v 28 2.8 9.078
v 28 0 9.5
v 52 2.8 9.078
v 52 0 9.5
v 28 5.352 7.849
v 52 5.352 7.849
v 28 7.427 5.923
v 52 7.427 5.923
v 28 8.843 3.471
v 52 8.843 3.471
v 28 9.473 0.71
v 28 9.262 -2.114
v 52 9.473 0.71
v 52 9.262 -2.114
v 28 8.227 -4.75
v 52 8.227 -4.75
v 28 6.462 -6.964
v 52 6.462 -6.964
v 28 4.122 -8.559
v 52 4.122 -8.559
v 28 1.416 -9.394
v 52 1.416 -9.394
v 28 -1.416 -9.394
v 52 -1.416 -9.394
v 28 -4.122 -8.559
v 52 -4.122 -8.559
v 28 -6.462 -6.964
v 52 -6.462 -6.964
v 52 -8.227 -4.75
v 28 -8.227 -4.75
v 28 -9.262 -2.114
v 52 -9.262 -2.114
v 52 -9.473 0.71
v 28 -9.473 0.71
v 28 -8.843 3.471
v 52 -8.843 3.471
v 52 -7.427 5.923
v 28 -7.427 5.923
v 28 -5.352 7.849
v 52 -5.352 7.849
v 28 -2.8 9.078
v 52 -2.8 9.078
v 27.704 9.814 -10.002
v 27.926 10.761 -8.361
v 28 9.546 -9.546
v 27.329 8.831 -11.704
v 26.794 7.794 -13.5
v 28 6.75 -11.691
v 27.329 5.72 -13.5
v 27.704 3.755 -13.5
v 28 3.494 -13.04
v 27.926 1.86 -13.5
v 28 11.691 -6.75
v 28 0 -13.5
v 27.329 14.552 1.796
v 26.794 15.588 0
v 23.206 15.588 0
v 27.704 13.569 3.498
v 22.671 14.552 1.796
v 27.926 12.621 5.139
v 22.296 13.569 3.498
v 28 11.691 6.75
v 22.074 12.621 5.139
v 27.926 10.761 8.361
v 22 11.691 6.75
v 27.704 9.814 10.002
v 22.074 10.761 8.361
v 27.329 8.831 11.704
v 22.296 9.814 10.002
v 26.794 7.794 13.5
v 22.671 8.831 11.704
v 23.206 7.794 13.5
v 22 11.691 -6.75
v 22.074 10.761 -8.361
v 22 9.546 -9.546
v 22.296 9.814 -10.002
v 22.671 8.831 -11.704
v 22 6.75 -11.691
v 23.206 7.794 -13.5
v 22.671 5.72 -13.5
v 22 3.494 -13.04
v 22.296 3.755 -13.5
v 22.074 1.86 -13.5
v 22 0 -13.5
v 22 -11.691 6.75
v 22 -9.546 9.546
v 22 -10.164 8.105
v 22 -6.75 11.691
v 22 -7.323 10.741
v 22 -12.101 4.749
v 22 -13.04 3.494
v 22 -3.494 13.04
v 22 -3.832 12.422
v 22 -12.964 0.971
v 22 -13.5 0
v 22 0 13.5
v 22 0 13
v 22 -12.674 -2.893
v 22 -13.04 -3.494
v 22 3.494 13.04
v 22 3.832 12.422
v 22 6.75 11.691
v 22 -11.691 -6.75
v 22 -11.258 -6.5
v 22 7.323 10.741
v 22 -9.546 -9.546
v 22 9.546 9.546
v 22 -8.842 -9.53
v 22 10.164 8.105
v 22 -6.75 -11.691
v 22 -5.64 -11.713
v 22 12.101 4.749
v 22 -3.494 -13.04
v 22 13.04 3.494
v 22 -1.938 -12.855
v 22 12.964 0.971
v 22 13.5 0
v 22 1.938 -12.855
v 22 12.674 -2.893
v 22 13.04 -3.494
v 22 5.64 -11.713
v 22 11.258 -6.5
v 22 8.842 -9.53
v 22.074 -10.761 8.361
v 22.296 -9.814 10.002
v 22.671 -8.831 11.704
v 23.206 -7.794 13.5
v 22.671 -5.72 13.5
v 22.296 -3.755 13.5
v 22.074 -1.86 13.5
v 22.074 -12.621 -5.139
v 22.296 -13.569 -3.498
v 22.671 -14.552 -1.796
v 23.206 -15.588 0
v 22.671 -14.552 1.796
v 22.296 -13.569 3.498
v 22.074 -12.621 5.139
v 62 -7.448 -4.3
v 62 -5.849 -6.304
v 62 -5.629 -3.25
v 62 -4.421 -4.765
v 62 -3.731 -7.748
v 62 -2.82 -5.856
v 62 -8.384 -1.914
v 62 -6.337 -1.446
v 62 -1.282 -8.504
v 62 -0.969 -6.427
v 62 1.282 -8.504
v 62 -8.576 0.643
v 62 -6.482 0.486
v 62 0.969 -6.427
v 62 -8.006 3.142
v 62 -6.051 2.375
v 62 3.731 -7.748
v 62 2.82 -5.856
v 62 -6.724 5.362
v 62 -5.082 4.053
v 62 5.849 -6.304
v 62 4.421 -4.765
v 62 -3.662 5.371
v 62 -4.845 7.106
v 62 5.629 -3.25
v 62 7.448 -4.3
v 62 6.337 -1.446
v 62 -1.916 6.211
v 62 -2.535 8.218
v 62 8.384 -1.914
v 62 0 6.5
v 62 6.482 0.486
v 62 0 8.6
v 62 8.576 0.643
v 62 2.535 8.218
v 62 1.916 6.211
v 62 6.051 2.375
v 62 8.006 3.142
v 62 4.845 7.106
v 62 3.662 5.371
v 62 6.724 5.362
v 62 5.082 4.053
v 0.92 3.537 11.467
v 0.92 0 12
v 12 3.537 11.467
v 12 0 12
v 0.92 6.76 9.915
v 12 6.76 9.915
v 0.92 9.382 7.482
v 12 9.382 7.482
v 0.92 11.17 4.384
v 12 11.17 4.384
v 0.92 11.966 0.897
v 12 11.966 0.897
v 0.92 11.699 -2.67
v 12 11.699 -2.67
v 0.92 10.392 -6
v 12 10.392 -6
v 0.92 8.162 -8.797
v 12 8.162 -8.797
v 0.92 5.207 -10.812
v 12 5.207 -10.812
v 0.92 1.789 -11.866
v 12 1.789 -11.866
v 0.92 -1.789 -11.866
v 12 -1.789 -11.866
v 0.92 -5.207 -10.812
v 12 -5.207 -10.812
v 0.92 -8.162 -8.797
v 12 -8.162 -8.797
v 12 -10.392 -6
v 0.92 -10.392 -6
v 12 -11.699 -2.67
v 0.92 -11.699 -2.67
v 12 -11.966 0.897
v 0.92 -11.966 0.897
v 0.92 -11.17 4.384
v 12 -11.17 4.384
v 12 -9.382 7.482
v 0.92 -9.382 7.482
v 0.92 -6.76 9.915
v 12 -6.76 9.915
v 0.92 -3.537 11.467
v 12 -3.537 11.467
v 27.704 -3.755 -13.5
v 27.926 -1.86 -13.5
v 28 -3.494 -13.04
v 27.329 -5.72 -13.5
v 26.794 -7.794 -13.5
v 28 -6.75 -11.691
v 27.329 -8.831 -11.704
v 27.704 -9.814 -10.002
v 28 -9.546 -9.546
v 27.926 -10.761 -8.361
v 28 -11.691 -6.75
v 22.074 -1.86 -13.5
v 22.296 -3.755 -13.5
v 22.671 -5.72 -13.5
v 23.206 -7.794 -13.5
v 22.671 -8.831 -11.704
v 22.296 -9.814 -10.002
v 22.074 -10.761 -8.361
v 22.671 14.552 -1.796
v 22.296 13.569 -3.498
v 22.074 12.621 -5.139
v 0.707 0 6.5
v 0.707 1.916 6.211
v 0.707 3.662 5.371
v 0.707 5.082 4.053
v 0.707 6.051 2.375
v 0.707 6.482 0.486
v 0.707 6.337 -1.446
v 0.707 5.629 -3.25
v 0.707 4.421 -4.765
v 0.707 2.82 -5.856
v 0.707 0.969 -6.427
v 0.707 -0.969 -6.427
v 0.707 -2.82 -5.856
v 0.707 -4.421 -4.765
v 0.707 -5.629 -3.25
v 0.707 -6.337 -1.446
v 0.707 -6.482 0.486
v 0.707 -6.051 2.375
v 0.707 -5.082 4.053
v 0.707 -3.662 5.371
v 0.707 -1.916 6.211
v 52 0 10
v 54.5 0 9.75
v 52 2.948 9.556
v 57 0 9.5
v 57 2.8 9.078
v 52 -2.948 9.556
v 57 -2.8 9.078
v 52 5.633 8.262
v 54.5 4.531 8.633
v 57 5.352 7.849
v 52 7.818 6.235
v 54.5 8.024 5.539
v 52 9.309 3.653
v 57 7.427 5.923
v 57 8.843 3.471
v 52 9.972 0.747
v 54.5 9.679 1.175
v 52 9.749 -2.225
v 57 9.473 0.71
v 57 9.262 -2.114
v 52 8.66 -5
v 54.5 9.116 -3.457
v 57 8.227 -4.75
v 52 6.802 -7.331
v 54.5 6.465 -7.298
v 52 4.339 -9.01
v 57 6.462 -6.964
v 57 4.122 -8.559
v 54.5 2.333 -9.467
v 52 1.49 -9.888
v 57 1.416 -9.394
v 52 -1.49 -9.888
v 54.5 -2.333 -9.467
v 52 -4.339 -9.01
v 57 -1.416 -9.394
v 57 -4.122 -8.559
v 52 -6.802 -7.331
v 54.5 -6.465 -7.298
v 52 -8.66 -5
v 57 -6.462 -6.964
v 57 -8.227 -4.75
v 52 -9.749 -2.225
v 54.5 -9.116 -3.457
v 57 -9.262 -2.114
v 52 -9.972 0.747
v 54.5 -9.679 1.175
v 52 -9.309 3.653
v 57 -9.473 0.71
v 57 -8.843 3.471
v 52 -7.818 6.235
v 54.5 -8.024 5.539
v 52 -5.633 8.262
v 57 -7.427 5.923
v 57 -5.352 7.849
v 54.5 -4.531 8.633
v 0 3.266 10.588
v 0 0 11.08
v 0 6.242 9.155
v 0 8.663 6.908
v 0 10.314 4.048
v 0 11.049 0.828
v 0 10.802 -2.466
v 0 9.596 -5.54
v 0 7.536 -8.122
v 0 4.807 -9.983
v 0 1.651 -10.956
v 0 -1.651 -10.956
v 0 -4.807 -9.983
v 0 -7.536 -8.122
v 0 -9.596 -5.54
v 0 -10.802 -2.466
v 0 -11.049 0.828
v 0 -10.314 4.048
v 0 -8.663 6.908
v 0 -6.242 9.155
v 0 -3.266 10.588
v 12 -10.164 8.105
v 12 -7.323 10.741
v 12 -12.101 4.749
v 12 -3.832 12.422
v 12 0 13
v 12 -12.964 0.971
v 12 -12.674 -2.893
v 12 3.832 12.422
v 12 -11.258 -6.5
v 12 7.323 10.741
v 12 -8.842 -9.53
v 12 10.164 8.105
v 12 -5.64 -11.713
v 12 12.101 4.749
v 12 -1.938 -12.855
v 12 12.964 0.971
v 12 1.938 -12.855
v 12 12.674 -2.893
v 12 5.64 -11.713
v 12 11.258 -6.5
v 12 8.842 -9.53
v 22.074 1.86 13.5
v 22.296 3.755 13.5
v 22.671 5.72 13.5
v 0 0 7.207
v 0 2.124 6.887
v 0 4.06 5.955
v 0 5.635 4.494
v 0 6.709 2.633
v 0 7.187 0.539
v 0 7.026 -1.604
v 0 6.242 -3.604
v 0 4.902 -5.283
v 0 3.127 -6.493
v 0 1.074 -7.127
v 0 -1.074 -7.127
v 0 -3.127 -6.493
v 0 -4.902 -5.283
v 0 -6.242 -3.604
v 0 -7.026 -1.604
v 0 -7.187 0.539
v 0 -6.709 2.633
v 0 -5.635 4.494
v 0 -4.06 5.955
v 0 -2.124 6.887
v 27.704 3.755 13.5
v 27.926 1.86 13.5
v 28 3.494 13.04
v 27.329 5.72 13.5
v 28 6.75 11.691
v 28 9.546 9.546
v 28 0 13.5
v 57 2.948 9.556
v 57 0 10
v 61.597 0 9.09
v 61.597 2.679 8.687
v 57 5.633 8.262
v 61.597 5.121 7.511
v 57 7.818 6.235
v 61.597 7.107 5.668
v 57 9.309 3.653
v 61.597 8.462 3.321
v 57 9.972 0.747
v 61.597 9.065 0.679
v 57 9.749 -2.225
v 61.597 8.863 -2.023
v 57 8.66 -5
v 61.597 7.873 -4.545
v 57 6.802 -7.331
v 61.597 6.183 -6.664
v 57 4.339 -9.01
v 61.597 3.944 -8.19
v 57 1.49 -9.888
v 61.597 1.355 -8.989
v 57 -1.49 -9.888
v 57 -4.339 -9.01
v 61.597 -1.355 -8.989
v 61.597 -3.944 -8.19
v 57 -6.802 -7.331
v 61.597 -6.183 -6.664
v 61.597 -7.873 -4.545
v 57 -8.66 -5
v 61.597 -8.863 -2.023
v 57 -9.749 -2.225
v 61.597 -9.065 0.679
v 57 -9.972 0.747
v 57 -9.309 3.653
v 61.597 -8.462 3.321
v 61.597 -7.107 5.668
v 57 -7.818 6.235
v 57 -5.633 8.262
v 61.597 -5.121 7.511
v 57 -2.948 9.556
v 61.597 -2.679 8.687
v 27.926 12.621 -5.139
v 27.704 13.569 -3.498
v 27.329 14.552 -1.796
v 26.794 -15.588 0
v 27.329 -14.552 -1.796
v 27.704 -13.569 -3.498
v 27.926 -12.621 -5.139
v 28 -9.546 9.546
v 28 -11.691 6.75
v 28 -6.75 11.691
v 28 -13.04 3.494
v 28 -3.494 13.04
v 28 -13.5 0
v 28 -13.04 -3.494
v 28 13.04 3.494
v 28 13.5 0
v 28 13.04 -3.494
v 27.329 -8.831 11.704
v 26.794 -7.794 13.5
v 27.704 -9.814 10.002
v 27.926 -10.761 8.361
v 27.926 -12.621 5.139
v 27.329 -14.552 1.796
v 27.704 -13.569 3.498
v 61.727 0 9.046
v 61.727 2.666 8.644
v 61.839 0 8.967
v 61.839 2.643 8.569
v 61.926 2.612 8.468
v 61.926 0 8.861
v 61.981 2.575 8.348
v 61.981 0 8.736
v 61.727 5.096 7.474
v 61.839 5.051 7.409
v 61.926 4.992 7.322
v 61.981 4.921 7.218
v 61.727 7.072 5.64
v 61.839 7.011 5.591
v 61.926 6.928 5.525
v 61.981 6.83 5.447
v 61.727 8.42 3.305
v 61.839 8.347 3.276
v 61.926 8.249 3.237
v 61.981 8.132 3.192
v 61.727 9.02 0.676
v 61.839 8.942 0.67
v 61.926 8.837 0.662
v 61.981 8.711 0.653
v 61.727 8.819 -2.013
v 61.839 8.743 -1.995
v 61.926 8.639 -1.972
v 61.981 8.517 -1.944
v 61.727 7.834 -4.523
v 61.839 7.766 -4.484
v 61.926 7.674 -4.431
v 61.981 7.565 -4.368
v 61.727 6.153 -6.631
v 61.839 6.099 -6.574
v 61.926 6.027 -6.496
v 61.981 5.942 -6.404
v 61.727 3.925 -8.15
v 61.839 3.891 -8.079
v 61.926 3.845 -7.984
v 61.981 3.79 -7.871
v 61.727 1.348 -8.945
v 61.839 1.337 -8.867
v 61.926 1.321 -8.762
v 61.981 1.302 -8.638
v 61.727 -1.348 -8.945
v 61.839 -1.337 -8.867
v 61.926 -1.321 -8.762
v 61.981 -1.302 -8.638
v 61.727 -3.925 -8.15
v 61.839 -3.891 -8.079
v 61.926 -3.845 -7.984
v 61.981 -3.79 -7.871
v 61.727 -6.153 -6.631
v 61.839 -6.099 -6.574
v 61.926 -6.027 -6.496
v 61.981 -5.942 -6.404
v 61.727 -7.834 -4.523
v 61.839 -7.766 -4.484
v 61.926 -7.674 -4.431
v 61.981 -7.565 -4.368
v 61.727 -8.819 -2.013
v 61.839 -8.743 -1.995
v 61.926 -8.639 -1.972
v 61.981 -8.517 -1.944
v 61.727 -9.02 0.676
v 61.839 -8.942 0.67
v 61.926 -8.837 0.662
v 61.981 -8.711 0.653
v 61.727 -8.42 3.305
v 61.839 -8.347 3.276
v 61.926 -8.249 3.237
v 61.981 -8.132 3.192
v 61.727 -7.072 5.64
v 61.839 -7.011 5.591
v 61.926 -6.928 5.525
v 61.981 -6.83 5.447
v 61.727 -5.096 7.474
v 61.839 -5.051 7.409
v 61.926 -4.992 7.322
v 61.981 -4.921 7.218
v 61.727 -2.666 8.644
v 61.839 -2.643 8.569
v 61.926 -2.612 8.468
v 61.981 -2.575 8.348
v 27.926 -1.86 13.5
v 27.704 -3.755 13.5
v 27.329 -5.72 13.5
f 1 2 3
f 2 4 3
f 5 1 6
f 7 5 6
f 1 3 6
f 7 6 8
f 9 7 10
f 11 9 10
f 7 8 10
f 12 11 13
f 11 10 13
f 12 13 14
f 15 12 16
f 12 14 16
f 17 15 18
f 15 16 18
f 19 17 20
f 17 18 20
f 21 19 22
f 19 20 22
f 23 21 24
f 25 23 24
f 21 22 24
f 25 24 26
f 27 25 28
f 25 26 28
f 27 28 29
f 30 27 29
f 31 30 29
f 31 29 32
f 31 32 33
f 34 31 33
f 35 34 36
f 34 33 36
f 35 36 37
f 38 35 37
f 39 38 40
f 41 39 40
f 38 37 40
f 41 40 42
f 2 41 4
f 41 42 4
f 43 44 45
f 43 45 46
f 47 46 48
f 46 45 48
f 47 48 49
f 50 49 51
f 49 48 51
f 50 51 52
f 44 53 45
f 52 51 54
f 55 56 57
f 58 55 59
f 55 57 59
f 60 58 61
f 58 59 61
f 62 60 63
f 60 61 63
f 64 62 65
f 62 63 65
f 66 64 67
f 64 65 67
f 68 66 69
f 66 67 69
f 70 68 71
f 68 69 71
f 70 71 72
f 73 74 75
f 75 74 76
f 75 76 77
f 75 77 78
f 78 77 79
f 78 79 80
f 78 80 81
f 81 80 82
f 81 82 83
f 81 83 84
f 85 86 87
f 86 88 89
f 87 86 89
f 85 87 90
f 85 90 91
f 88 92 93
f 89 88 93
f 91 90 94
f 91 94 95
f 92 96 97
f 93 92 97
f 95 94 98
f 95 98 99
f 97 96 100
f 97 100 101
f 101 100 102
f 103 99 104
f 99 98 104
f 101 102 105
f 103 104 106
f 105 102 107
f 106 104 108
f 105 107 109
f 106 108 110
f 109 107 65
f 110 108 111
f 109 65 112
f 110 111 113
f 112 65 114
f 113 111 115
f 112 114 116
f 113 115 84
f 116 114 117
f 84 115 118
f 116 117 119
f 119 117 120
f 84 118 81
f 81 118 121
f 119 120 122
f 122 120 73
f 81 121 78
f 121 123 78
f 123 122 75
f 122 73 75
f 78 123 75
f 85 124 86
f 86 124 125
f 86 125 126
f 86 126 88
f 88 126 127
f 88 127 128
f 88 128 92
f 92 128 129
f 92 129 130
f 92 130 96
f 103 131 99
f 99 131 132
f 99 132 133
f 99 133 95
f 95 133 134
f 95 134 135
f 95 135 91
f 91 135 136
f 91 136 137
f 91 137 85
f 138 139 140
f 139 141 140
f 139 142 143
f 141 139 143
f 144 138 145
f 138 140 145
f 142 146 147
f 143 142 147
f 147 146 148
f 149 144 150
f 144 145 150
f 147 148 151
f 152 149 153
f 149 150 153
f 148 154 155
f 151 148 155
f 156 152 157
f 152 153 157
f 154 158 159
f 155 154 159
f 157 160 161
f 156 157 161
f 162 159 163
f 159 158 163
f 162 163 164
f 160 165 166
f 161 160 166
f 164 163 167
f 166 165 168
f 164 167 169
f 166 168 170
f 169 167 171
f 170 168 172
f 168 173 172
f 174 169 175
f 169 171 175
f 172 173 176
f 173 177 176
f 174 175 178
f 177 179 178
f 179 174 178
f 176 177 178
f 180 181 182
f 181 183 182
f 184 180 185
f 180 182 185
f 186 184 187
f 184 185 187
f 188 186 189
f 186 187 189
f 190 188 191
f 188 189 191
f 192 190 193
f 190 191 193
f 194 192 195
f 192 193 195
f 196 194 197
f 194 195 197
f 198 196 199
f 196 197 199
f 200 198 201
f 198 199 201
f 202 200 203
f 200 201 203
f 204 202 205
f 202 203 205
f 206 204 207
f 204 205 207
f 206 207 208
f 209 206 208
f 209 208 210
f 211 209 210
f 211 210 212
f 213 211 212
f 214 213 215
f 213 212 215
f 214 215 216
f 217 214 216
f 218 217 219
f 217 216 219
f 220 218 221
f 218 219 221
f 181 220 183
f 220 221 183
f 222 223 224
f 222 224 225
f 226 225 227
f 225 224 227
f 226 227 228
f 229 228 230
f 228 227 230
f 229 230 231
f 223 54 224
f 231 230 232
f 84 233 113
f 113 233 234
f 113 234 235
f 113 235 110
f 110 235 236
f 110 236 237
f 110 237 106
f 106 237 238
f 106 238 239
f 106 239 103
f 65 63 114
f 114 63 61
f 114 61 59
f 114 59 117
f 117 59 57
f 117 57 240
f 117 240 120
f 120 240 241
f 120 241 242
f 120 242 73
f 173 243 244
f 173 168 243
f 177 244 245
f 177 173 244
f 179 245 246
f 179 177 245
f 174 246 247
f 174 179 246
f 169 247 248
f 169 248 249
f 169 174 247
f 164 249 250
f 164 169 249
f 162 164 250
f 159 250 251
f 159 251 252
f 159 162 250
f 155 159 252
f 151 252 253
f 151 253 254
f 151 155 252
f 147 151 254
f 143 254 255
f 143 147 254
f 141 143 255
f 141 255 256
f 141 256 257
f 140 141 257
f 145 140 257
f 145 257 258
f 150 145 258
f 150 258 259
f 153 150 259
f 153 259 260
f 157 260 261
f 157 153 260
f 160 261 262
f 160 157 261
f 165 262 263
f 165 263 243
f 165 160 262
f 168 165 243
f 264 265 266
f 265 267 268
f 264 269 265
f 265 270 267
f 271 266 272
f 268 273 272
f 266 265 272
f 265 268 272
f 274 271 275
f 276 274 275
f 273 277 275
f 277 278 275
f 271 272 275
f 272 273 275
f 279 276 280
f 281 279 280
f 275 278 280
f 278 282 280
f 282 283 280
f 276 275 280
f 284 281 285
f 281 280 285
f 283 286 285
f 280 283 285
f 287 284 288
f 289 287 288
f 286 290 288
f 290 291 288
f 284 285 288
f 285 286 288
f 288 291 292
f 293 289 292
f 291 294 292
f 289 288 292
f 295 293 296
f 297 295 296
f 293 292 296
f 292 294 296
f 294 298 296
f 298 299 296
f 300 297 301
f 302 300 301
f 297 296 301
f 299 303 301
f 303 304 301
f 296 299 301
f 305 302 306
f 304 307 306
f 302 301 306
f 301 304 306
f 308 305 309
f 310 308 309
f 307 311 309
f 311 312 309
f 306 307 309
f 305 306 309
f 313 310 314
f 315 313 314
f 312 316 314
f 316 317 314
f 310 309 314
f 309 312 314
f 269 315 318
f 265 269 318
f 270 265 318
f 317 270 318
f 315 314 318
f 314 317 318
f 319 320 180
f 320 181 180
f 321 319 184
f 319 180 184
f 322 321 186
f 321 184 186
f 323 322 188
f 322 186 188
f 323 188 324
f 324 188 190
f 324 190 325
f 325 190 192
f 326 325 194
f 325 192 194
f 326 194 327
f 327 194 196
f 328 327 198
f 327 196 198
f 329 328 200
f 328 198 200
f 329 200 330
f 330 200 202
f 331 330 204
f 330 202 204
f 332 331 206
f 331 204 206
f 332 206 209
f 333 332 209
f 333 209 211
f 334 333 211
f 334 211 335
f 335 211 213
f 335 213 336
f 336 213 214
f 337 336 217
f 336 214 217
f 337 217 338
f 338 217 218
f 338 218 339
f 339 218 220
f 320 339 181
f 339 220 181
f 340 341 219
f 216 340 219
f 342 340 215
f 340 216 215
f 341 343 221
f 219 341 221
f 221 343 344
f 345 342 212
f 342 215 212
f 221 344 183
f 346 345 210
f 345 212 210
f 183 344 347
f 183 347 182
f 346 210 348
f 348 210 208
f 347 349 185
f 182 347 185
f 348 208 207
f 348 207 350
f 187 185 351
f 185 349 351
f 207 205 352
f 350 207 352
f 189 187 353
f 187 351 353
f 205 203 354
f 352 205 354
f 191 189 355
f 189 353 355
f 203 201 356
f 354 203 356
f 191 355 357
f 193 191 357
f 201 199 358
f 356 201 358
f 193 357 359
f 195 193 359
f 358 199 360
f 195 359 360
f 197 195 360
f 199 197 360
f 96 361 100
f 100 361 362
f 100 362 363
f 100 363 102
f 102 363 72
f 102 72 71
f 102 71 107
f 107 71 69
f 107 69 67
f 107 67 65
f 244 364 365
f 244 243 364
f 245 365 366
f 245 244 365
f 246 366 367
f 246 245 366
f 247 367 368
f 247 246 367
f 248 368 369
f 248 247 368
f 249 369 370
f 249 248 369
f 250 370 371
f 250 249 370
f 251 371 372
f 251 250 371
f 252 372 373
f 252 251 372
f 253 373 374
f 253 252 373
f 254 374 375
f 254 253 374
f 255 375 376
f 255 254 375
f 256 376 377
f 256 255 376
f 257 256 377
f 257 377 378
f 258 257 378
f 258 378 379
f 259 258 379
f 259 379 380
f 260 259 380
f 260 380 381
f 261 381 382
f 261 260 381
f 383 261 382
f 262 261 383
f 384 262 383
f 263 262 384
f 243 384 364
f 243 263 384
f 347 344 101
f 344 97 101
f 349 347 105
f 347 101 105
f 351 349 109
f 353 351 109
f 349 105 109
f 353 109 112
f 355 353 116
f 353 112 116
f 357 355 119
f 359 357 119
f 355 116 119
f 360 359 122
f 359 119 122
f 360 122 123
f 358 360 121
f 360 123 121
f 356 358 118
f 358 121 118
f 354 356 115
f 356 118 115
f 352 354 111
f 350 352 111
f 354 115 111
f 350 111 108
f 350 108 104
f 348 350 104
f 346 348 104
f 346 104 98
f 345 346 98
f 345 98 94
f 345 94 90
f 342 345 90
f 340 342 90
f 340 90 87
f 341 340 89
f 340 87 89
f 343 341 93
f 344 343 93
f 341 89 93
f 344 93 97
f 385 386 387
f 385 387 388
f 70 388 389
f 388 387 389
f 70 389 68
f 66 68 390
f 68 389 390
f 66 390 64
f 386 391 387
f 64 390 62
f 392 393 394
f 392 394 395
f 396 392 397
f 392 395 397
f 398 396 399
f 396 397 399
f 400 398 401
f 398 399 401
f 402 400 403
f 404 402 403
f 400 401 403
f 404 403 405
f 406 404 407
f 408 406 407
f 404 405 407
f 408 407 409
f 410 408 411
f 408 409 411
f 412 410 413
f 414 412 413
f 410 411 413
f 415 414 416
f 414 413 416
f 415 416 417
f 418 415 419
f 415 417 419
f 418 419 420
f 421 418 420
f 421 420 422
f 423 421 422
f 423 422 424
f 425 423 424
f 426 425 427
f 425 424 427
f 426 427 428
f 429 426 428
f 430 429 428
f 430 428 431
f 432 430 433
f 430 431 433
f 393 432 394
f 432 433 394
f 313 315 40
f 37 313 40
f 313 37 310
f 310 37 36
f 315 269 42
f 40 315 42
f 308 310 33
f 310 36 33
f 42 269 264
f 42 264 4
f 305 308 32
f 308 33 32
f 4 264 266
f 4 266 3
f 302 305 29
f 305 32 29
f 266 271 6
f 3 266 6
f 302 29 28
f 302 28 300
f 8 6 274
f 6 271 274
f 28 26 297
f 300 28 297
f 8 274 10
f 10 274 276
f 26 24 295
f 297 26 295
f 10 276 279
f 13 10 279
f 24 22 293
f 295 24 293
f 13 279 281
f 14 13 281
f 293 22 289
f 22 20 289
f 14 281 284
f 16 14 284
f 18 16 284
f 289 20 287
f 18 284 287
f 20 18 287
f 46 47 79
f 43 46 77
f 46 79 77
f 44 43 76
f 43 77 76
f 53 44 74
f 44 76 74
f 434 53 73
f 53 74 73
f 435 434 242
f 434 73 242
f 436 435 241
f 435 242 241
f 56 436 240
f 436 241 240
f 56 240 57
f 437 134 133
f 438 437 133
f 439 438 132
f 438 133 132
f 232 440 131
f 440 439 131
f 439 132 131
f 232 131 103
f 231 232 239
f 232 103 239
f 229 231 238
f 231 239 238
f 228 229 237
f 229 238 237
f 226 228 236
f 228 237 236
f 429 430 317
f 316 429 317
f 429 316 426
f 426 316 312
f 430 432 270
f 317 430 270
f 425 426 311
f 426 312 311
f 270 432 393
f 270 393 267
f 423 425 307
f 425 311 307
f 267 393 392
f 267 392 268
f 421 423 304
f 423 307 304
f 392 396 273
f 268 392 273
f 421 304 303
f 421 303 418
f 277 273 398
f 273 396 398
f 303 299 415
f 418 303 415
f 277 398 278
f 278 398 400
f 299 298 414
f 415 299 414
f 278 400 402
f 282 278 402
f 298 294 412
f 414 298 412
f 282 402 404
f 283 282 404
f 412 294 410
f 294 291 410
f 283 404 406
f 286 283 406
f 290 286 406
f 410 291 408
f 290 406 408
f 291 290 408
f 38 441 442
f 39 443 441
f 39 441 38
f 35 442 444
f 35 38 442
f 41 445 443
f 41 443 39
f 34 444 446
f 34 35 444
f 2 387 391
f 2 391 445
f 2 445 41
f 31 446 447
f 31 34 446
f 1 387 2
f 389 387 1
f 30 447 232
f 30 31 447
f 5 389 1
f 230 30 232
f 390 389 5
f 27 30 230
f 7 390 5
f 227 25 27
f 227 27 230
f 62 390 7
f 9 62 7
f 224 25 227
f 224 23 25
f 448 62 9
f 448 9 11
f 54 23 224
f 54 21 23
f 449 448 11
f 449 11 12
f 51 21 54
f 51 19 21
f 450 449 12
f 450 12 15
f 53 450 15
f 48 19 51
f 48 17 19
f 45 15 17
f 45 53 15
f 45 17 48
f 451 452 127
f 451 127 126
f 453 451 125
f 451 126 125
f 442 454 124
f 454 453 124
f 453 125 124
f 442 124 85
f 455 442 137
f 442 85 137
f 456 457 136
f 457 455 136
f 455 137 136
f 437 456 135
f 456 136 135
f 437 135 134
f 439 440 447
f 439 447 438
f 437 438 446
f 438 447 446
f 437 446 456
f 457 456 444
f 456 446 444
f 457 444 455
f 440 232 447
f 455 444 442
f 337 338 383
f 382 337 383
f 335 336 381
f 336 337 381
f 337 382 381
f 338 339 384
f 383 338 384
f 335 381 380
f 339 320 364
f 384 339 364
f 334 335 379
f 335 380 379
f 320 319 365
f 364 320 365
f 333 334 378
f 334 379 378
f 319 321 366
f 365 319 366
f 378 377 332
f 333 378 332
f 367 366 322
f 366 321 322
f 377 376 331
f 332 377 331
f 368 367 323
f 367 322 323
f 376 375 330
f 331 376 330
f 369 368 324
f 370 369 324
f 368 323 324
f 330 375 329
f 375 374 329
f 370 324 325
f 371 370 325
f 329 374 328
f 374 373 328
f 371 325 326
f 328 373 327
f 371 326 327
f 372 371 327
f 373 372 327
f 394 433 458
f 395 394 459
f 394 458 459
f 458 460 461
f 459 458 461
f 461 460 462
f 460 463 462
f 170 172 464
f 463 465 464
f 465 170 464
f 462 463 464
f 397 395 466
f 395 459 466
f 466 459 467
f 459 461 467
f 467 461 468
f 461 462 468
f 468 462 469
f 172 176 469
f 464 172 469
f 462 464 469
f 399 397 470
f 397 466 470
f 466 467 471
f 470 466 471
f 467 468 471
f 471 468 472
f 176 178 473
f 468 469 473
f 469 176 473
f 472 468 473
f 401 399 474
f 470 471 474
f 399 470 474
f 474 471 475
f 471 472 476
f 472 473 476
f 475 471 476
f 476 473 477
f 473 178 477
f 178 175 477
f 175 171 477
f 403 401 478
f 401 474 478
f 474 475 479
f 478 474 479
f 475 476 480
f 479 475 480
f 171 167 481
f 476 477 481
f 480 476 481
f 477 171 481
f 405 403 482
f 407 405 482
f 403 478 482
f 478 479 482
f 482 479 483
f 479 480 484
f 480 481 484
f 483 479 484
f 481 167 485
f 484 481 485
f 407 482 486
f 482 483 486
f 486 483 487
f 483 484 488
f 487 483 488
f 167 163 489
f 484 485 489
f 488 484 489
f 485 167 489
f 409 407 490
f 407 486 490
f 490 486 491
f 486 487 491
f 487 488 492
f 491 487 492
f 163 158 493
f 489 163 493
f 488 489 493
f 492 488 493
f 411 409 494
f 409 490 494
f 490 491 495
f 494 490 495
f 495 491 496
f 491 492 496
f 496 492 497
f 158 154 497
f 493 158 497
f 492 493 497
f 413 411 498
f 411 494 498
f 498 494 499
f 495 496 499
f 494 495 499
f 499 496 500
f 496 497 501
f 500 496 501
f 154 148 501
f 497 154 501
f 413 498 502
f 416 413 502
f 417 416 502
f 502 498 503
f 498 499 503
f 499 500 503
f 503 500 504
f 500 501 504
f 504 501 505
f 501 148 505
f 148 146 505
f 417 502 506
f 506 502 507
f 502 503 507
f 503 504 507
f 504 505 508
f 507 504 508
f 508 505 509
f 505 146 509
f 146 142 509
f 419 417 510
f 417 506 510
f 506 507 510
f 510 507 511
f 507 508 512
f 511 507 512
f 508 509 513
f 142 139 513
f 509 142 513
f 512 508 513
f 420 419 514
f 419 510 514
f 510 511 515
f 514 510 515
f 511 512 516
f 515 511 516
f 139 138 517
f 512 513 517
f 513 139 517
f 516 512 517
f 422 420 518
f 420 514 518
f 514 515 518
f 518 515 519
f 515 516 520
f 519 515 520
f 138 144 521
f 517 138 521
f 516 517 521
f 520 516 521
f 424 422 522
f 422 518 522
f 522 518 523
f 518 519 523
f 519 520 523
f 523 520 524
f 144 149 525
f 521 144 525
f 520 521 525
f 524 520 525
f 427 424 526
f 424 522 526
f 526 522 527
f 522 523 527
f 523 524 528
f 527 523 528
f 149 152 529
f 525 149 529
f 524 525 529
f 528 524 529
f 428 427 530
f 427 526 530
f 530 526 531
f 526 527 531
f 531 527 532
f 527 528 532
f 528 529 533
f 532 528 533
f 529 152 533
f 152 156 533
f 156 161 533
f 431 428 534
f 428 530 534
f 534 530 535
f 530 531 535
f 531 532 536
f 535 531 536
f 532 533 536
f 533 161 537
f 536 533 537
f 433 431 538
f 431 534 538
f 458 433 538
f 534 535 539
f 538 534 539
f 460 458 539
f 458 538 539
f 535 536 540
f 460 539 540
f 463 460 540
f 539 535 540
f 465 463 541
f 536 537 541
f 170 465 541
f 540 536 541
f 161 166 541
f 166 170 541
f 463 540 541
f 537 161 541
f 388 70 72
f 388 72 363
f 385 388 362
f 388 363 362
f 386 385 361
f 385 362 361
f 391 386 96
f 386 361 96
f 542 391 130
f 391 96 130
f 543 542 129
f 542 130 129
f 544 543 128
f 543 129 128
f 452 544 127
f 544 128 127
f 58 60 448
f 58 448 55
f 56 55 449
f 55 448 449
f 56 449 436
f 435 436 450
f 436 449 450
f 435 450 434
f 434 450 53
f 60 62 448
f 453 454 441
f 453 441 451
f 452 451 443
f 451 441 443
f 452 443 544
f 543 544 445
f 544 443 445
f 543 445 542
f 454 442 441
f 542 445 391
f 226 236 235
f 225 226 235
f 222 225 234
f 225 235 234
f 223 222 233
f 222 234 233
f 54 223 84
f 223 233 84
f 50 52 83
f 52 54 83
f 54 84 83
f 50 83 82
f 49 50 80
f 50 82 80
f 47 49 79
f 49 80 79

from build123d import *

# Parameters (mm, degrees)
SZKIC2_W                    = 10
SZKIC2_H                    = 13
DODANIE_WYCI_GNI_CIE1_DEPTH = 6
SZKIC4_W                    = 24
SZKIC4_H                    = 9.5


with BuildPart() as part:
    # Szkic1 → Obrót1 (revolve)
    with BuildSketch(Plane.XY, mode=Mode.PRIVATE) as obr_t1_sk:
        Polygon((0, 0), (0, 11.08), (0.92, 12), (12, 12), (12, 0), align=None)
    revolve(obr_t1_sk.sketch.rotate(Axis((12, 0, 0), (-1, 0, 0)), 270), axis=Axis((12, 0, 0), (-1, 0, 0)))

    # Szkic2 → Obrót2 (revolve)
    with BuildSketch(Plane.XY, mode=Mode.PRIVATE) as obr_t2_sk:
        with Locations((17, 6.5)):
            Rectangle(SZKIC2_W, SZKIC2_H)
    revolve(obr_t2_sk.sketch.rotate(Axis((22, 0, 0), (-1, 0, 0)), 270), axis=Axis((22, 0, 0), (-1, 0, 0)))

    # Szkic3 → Dodanie-wyciągnięcie1 (add)
    with BuildSketch(Plane(origin=(22, 0, 0), x_dir=(0, 0, -1), z_dir=(1, 0, 0))):
        Polygon((-13.5, 7.794228634), (-13.5, -7.794228634), (0, -15.588457268), (13.5, -7.794228634), (13.5, 7.794228634), (0, 15.588457268), align=None)
    extrude(amount=DODANIE_WYCI_GNI_CIE1_DEPTH)

    # Szkic4 → Obrót3 (revolve)
    with BuildSketch(Plane.XY, mode=Mode.PRIVATE) as obr_t3_sk:
        with Locations((40, 4.75)):
            Rectangle(SZKIC4_W, SZKIC4_H)
    revolve(obr_t3_sk.sketch.rotate(Axis((52, 0, 0), (-1, 0, 0)), 270), axis=Axis((52, 0, 0), (-1, 0, 0)))

    # Szkic5 → Obrót4 (revolve)
    with BuildSketch(Plane.XY, mode=Mode.PRIVATE) as obr_t4_sk:
        with BuildLine():
            Line((52, 0), (52, 10))
            Line((52, 10), (57, 9.5))
            Line((57, 9.5), (57, 10))
            Line((57, 10), (61.597042092, 9.090492439))
            ThreePointArc((61.597042092, 9.090492439), (61.886342494, 8.917394828), (62, 8.6))
            Line((62, 8.6), (62, 0))
            Line((62, 0), (52, 0))
        make_face()
    revolve(obr_t4_sk.sketch.rotate(Axis((62, 0, 0), (-1, 0, 0)), 270), axis=Axis((62, 0, 0), (-1, 0, 0)))

    # Szkic6 → Wycięcie-obrót1 (revolve, cut)
    with BuildSketch(Plane.XY, mode=Mode.PRIVATE) as wyci_cie_obr_t1_sk:
        Polygon((0, 0), (0, 7.207106781), (0.707106781, 6.5), (62, 6.5), (62, 0), align=None)
    revolve(wyci_cie_obr_t1_sk.sketch.rotate(Axis((62, 0, 0), (-1, 0, 0)), 270), axis=Axis((62, 0, 0), (-1, 0, 0)), mode=Mode.SUBTRACT)

    # Szkic7 → Wycięcie-obrót2 (revolve, cut)
    with BuildSketch(Plane.XY):
        Polygon((22, 13.5), (29.794228634, 27), (22, 27), align=None)
    revolve(axis=Axis((22, 0, 0), (-1, 0, 0)), mode=Mode.SUBTRACT)

    # Szkic8 → Wycięcie-obrót3 (revolve, cut)
    with BuildSketch(Plane.XY):
        Polygon((20.205771366, 27), (28, 13.5), (28, 27), align=None)
    revolve(axis=Axis((22, 0, 0), (-1, 0, 0)), mode=Mode.SUBTRACT)


solid = part.part
